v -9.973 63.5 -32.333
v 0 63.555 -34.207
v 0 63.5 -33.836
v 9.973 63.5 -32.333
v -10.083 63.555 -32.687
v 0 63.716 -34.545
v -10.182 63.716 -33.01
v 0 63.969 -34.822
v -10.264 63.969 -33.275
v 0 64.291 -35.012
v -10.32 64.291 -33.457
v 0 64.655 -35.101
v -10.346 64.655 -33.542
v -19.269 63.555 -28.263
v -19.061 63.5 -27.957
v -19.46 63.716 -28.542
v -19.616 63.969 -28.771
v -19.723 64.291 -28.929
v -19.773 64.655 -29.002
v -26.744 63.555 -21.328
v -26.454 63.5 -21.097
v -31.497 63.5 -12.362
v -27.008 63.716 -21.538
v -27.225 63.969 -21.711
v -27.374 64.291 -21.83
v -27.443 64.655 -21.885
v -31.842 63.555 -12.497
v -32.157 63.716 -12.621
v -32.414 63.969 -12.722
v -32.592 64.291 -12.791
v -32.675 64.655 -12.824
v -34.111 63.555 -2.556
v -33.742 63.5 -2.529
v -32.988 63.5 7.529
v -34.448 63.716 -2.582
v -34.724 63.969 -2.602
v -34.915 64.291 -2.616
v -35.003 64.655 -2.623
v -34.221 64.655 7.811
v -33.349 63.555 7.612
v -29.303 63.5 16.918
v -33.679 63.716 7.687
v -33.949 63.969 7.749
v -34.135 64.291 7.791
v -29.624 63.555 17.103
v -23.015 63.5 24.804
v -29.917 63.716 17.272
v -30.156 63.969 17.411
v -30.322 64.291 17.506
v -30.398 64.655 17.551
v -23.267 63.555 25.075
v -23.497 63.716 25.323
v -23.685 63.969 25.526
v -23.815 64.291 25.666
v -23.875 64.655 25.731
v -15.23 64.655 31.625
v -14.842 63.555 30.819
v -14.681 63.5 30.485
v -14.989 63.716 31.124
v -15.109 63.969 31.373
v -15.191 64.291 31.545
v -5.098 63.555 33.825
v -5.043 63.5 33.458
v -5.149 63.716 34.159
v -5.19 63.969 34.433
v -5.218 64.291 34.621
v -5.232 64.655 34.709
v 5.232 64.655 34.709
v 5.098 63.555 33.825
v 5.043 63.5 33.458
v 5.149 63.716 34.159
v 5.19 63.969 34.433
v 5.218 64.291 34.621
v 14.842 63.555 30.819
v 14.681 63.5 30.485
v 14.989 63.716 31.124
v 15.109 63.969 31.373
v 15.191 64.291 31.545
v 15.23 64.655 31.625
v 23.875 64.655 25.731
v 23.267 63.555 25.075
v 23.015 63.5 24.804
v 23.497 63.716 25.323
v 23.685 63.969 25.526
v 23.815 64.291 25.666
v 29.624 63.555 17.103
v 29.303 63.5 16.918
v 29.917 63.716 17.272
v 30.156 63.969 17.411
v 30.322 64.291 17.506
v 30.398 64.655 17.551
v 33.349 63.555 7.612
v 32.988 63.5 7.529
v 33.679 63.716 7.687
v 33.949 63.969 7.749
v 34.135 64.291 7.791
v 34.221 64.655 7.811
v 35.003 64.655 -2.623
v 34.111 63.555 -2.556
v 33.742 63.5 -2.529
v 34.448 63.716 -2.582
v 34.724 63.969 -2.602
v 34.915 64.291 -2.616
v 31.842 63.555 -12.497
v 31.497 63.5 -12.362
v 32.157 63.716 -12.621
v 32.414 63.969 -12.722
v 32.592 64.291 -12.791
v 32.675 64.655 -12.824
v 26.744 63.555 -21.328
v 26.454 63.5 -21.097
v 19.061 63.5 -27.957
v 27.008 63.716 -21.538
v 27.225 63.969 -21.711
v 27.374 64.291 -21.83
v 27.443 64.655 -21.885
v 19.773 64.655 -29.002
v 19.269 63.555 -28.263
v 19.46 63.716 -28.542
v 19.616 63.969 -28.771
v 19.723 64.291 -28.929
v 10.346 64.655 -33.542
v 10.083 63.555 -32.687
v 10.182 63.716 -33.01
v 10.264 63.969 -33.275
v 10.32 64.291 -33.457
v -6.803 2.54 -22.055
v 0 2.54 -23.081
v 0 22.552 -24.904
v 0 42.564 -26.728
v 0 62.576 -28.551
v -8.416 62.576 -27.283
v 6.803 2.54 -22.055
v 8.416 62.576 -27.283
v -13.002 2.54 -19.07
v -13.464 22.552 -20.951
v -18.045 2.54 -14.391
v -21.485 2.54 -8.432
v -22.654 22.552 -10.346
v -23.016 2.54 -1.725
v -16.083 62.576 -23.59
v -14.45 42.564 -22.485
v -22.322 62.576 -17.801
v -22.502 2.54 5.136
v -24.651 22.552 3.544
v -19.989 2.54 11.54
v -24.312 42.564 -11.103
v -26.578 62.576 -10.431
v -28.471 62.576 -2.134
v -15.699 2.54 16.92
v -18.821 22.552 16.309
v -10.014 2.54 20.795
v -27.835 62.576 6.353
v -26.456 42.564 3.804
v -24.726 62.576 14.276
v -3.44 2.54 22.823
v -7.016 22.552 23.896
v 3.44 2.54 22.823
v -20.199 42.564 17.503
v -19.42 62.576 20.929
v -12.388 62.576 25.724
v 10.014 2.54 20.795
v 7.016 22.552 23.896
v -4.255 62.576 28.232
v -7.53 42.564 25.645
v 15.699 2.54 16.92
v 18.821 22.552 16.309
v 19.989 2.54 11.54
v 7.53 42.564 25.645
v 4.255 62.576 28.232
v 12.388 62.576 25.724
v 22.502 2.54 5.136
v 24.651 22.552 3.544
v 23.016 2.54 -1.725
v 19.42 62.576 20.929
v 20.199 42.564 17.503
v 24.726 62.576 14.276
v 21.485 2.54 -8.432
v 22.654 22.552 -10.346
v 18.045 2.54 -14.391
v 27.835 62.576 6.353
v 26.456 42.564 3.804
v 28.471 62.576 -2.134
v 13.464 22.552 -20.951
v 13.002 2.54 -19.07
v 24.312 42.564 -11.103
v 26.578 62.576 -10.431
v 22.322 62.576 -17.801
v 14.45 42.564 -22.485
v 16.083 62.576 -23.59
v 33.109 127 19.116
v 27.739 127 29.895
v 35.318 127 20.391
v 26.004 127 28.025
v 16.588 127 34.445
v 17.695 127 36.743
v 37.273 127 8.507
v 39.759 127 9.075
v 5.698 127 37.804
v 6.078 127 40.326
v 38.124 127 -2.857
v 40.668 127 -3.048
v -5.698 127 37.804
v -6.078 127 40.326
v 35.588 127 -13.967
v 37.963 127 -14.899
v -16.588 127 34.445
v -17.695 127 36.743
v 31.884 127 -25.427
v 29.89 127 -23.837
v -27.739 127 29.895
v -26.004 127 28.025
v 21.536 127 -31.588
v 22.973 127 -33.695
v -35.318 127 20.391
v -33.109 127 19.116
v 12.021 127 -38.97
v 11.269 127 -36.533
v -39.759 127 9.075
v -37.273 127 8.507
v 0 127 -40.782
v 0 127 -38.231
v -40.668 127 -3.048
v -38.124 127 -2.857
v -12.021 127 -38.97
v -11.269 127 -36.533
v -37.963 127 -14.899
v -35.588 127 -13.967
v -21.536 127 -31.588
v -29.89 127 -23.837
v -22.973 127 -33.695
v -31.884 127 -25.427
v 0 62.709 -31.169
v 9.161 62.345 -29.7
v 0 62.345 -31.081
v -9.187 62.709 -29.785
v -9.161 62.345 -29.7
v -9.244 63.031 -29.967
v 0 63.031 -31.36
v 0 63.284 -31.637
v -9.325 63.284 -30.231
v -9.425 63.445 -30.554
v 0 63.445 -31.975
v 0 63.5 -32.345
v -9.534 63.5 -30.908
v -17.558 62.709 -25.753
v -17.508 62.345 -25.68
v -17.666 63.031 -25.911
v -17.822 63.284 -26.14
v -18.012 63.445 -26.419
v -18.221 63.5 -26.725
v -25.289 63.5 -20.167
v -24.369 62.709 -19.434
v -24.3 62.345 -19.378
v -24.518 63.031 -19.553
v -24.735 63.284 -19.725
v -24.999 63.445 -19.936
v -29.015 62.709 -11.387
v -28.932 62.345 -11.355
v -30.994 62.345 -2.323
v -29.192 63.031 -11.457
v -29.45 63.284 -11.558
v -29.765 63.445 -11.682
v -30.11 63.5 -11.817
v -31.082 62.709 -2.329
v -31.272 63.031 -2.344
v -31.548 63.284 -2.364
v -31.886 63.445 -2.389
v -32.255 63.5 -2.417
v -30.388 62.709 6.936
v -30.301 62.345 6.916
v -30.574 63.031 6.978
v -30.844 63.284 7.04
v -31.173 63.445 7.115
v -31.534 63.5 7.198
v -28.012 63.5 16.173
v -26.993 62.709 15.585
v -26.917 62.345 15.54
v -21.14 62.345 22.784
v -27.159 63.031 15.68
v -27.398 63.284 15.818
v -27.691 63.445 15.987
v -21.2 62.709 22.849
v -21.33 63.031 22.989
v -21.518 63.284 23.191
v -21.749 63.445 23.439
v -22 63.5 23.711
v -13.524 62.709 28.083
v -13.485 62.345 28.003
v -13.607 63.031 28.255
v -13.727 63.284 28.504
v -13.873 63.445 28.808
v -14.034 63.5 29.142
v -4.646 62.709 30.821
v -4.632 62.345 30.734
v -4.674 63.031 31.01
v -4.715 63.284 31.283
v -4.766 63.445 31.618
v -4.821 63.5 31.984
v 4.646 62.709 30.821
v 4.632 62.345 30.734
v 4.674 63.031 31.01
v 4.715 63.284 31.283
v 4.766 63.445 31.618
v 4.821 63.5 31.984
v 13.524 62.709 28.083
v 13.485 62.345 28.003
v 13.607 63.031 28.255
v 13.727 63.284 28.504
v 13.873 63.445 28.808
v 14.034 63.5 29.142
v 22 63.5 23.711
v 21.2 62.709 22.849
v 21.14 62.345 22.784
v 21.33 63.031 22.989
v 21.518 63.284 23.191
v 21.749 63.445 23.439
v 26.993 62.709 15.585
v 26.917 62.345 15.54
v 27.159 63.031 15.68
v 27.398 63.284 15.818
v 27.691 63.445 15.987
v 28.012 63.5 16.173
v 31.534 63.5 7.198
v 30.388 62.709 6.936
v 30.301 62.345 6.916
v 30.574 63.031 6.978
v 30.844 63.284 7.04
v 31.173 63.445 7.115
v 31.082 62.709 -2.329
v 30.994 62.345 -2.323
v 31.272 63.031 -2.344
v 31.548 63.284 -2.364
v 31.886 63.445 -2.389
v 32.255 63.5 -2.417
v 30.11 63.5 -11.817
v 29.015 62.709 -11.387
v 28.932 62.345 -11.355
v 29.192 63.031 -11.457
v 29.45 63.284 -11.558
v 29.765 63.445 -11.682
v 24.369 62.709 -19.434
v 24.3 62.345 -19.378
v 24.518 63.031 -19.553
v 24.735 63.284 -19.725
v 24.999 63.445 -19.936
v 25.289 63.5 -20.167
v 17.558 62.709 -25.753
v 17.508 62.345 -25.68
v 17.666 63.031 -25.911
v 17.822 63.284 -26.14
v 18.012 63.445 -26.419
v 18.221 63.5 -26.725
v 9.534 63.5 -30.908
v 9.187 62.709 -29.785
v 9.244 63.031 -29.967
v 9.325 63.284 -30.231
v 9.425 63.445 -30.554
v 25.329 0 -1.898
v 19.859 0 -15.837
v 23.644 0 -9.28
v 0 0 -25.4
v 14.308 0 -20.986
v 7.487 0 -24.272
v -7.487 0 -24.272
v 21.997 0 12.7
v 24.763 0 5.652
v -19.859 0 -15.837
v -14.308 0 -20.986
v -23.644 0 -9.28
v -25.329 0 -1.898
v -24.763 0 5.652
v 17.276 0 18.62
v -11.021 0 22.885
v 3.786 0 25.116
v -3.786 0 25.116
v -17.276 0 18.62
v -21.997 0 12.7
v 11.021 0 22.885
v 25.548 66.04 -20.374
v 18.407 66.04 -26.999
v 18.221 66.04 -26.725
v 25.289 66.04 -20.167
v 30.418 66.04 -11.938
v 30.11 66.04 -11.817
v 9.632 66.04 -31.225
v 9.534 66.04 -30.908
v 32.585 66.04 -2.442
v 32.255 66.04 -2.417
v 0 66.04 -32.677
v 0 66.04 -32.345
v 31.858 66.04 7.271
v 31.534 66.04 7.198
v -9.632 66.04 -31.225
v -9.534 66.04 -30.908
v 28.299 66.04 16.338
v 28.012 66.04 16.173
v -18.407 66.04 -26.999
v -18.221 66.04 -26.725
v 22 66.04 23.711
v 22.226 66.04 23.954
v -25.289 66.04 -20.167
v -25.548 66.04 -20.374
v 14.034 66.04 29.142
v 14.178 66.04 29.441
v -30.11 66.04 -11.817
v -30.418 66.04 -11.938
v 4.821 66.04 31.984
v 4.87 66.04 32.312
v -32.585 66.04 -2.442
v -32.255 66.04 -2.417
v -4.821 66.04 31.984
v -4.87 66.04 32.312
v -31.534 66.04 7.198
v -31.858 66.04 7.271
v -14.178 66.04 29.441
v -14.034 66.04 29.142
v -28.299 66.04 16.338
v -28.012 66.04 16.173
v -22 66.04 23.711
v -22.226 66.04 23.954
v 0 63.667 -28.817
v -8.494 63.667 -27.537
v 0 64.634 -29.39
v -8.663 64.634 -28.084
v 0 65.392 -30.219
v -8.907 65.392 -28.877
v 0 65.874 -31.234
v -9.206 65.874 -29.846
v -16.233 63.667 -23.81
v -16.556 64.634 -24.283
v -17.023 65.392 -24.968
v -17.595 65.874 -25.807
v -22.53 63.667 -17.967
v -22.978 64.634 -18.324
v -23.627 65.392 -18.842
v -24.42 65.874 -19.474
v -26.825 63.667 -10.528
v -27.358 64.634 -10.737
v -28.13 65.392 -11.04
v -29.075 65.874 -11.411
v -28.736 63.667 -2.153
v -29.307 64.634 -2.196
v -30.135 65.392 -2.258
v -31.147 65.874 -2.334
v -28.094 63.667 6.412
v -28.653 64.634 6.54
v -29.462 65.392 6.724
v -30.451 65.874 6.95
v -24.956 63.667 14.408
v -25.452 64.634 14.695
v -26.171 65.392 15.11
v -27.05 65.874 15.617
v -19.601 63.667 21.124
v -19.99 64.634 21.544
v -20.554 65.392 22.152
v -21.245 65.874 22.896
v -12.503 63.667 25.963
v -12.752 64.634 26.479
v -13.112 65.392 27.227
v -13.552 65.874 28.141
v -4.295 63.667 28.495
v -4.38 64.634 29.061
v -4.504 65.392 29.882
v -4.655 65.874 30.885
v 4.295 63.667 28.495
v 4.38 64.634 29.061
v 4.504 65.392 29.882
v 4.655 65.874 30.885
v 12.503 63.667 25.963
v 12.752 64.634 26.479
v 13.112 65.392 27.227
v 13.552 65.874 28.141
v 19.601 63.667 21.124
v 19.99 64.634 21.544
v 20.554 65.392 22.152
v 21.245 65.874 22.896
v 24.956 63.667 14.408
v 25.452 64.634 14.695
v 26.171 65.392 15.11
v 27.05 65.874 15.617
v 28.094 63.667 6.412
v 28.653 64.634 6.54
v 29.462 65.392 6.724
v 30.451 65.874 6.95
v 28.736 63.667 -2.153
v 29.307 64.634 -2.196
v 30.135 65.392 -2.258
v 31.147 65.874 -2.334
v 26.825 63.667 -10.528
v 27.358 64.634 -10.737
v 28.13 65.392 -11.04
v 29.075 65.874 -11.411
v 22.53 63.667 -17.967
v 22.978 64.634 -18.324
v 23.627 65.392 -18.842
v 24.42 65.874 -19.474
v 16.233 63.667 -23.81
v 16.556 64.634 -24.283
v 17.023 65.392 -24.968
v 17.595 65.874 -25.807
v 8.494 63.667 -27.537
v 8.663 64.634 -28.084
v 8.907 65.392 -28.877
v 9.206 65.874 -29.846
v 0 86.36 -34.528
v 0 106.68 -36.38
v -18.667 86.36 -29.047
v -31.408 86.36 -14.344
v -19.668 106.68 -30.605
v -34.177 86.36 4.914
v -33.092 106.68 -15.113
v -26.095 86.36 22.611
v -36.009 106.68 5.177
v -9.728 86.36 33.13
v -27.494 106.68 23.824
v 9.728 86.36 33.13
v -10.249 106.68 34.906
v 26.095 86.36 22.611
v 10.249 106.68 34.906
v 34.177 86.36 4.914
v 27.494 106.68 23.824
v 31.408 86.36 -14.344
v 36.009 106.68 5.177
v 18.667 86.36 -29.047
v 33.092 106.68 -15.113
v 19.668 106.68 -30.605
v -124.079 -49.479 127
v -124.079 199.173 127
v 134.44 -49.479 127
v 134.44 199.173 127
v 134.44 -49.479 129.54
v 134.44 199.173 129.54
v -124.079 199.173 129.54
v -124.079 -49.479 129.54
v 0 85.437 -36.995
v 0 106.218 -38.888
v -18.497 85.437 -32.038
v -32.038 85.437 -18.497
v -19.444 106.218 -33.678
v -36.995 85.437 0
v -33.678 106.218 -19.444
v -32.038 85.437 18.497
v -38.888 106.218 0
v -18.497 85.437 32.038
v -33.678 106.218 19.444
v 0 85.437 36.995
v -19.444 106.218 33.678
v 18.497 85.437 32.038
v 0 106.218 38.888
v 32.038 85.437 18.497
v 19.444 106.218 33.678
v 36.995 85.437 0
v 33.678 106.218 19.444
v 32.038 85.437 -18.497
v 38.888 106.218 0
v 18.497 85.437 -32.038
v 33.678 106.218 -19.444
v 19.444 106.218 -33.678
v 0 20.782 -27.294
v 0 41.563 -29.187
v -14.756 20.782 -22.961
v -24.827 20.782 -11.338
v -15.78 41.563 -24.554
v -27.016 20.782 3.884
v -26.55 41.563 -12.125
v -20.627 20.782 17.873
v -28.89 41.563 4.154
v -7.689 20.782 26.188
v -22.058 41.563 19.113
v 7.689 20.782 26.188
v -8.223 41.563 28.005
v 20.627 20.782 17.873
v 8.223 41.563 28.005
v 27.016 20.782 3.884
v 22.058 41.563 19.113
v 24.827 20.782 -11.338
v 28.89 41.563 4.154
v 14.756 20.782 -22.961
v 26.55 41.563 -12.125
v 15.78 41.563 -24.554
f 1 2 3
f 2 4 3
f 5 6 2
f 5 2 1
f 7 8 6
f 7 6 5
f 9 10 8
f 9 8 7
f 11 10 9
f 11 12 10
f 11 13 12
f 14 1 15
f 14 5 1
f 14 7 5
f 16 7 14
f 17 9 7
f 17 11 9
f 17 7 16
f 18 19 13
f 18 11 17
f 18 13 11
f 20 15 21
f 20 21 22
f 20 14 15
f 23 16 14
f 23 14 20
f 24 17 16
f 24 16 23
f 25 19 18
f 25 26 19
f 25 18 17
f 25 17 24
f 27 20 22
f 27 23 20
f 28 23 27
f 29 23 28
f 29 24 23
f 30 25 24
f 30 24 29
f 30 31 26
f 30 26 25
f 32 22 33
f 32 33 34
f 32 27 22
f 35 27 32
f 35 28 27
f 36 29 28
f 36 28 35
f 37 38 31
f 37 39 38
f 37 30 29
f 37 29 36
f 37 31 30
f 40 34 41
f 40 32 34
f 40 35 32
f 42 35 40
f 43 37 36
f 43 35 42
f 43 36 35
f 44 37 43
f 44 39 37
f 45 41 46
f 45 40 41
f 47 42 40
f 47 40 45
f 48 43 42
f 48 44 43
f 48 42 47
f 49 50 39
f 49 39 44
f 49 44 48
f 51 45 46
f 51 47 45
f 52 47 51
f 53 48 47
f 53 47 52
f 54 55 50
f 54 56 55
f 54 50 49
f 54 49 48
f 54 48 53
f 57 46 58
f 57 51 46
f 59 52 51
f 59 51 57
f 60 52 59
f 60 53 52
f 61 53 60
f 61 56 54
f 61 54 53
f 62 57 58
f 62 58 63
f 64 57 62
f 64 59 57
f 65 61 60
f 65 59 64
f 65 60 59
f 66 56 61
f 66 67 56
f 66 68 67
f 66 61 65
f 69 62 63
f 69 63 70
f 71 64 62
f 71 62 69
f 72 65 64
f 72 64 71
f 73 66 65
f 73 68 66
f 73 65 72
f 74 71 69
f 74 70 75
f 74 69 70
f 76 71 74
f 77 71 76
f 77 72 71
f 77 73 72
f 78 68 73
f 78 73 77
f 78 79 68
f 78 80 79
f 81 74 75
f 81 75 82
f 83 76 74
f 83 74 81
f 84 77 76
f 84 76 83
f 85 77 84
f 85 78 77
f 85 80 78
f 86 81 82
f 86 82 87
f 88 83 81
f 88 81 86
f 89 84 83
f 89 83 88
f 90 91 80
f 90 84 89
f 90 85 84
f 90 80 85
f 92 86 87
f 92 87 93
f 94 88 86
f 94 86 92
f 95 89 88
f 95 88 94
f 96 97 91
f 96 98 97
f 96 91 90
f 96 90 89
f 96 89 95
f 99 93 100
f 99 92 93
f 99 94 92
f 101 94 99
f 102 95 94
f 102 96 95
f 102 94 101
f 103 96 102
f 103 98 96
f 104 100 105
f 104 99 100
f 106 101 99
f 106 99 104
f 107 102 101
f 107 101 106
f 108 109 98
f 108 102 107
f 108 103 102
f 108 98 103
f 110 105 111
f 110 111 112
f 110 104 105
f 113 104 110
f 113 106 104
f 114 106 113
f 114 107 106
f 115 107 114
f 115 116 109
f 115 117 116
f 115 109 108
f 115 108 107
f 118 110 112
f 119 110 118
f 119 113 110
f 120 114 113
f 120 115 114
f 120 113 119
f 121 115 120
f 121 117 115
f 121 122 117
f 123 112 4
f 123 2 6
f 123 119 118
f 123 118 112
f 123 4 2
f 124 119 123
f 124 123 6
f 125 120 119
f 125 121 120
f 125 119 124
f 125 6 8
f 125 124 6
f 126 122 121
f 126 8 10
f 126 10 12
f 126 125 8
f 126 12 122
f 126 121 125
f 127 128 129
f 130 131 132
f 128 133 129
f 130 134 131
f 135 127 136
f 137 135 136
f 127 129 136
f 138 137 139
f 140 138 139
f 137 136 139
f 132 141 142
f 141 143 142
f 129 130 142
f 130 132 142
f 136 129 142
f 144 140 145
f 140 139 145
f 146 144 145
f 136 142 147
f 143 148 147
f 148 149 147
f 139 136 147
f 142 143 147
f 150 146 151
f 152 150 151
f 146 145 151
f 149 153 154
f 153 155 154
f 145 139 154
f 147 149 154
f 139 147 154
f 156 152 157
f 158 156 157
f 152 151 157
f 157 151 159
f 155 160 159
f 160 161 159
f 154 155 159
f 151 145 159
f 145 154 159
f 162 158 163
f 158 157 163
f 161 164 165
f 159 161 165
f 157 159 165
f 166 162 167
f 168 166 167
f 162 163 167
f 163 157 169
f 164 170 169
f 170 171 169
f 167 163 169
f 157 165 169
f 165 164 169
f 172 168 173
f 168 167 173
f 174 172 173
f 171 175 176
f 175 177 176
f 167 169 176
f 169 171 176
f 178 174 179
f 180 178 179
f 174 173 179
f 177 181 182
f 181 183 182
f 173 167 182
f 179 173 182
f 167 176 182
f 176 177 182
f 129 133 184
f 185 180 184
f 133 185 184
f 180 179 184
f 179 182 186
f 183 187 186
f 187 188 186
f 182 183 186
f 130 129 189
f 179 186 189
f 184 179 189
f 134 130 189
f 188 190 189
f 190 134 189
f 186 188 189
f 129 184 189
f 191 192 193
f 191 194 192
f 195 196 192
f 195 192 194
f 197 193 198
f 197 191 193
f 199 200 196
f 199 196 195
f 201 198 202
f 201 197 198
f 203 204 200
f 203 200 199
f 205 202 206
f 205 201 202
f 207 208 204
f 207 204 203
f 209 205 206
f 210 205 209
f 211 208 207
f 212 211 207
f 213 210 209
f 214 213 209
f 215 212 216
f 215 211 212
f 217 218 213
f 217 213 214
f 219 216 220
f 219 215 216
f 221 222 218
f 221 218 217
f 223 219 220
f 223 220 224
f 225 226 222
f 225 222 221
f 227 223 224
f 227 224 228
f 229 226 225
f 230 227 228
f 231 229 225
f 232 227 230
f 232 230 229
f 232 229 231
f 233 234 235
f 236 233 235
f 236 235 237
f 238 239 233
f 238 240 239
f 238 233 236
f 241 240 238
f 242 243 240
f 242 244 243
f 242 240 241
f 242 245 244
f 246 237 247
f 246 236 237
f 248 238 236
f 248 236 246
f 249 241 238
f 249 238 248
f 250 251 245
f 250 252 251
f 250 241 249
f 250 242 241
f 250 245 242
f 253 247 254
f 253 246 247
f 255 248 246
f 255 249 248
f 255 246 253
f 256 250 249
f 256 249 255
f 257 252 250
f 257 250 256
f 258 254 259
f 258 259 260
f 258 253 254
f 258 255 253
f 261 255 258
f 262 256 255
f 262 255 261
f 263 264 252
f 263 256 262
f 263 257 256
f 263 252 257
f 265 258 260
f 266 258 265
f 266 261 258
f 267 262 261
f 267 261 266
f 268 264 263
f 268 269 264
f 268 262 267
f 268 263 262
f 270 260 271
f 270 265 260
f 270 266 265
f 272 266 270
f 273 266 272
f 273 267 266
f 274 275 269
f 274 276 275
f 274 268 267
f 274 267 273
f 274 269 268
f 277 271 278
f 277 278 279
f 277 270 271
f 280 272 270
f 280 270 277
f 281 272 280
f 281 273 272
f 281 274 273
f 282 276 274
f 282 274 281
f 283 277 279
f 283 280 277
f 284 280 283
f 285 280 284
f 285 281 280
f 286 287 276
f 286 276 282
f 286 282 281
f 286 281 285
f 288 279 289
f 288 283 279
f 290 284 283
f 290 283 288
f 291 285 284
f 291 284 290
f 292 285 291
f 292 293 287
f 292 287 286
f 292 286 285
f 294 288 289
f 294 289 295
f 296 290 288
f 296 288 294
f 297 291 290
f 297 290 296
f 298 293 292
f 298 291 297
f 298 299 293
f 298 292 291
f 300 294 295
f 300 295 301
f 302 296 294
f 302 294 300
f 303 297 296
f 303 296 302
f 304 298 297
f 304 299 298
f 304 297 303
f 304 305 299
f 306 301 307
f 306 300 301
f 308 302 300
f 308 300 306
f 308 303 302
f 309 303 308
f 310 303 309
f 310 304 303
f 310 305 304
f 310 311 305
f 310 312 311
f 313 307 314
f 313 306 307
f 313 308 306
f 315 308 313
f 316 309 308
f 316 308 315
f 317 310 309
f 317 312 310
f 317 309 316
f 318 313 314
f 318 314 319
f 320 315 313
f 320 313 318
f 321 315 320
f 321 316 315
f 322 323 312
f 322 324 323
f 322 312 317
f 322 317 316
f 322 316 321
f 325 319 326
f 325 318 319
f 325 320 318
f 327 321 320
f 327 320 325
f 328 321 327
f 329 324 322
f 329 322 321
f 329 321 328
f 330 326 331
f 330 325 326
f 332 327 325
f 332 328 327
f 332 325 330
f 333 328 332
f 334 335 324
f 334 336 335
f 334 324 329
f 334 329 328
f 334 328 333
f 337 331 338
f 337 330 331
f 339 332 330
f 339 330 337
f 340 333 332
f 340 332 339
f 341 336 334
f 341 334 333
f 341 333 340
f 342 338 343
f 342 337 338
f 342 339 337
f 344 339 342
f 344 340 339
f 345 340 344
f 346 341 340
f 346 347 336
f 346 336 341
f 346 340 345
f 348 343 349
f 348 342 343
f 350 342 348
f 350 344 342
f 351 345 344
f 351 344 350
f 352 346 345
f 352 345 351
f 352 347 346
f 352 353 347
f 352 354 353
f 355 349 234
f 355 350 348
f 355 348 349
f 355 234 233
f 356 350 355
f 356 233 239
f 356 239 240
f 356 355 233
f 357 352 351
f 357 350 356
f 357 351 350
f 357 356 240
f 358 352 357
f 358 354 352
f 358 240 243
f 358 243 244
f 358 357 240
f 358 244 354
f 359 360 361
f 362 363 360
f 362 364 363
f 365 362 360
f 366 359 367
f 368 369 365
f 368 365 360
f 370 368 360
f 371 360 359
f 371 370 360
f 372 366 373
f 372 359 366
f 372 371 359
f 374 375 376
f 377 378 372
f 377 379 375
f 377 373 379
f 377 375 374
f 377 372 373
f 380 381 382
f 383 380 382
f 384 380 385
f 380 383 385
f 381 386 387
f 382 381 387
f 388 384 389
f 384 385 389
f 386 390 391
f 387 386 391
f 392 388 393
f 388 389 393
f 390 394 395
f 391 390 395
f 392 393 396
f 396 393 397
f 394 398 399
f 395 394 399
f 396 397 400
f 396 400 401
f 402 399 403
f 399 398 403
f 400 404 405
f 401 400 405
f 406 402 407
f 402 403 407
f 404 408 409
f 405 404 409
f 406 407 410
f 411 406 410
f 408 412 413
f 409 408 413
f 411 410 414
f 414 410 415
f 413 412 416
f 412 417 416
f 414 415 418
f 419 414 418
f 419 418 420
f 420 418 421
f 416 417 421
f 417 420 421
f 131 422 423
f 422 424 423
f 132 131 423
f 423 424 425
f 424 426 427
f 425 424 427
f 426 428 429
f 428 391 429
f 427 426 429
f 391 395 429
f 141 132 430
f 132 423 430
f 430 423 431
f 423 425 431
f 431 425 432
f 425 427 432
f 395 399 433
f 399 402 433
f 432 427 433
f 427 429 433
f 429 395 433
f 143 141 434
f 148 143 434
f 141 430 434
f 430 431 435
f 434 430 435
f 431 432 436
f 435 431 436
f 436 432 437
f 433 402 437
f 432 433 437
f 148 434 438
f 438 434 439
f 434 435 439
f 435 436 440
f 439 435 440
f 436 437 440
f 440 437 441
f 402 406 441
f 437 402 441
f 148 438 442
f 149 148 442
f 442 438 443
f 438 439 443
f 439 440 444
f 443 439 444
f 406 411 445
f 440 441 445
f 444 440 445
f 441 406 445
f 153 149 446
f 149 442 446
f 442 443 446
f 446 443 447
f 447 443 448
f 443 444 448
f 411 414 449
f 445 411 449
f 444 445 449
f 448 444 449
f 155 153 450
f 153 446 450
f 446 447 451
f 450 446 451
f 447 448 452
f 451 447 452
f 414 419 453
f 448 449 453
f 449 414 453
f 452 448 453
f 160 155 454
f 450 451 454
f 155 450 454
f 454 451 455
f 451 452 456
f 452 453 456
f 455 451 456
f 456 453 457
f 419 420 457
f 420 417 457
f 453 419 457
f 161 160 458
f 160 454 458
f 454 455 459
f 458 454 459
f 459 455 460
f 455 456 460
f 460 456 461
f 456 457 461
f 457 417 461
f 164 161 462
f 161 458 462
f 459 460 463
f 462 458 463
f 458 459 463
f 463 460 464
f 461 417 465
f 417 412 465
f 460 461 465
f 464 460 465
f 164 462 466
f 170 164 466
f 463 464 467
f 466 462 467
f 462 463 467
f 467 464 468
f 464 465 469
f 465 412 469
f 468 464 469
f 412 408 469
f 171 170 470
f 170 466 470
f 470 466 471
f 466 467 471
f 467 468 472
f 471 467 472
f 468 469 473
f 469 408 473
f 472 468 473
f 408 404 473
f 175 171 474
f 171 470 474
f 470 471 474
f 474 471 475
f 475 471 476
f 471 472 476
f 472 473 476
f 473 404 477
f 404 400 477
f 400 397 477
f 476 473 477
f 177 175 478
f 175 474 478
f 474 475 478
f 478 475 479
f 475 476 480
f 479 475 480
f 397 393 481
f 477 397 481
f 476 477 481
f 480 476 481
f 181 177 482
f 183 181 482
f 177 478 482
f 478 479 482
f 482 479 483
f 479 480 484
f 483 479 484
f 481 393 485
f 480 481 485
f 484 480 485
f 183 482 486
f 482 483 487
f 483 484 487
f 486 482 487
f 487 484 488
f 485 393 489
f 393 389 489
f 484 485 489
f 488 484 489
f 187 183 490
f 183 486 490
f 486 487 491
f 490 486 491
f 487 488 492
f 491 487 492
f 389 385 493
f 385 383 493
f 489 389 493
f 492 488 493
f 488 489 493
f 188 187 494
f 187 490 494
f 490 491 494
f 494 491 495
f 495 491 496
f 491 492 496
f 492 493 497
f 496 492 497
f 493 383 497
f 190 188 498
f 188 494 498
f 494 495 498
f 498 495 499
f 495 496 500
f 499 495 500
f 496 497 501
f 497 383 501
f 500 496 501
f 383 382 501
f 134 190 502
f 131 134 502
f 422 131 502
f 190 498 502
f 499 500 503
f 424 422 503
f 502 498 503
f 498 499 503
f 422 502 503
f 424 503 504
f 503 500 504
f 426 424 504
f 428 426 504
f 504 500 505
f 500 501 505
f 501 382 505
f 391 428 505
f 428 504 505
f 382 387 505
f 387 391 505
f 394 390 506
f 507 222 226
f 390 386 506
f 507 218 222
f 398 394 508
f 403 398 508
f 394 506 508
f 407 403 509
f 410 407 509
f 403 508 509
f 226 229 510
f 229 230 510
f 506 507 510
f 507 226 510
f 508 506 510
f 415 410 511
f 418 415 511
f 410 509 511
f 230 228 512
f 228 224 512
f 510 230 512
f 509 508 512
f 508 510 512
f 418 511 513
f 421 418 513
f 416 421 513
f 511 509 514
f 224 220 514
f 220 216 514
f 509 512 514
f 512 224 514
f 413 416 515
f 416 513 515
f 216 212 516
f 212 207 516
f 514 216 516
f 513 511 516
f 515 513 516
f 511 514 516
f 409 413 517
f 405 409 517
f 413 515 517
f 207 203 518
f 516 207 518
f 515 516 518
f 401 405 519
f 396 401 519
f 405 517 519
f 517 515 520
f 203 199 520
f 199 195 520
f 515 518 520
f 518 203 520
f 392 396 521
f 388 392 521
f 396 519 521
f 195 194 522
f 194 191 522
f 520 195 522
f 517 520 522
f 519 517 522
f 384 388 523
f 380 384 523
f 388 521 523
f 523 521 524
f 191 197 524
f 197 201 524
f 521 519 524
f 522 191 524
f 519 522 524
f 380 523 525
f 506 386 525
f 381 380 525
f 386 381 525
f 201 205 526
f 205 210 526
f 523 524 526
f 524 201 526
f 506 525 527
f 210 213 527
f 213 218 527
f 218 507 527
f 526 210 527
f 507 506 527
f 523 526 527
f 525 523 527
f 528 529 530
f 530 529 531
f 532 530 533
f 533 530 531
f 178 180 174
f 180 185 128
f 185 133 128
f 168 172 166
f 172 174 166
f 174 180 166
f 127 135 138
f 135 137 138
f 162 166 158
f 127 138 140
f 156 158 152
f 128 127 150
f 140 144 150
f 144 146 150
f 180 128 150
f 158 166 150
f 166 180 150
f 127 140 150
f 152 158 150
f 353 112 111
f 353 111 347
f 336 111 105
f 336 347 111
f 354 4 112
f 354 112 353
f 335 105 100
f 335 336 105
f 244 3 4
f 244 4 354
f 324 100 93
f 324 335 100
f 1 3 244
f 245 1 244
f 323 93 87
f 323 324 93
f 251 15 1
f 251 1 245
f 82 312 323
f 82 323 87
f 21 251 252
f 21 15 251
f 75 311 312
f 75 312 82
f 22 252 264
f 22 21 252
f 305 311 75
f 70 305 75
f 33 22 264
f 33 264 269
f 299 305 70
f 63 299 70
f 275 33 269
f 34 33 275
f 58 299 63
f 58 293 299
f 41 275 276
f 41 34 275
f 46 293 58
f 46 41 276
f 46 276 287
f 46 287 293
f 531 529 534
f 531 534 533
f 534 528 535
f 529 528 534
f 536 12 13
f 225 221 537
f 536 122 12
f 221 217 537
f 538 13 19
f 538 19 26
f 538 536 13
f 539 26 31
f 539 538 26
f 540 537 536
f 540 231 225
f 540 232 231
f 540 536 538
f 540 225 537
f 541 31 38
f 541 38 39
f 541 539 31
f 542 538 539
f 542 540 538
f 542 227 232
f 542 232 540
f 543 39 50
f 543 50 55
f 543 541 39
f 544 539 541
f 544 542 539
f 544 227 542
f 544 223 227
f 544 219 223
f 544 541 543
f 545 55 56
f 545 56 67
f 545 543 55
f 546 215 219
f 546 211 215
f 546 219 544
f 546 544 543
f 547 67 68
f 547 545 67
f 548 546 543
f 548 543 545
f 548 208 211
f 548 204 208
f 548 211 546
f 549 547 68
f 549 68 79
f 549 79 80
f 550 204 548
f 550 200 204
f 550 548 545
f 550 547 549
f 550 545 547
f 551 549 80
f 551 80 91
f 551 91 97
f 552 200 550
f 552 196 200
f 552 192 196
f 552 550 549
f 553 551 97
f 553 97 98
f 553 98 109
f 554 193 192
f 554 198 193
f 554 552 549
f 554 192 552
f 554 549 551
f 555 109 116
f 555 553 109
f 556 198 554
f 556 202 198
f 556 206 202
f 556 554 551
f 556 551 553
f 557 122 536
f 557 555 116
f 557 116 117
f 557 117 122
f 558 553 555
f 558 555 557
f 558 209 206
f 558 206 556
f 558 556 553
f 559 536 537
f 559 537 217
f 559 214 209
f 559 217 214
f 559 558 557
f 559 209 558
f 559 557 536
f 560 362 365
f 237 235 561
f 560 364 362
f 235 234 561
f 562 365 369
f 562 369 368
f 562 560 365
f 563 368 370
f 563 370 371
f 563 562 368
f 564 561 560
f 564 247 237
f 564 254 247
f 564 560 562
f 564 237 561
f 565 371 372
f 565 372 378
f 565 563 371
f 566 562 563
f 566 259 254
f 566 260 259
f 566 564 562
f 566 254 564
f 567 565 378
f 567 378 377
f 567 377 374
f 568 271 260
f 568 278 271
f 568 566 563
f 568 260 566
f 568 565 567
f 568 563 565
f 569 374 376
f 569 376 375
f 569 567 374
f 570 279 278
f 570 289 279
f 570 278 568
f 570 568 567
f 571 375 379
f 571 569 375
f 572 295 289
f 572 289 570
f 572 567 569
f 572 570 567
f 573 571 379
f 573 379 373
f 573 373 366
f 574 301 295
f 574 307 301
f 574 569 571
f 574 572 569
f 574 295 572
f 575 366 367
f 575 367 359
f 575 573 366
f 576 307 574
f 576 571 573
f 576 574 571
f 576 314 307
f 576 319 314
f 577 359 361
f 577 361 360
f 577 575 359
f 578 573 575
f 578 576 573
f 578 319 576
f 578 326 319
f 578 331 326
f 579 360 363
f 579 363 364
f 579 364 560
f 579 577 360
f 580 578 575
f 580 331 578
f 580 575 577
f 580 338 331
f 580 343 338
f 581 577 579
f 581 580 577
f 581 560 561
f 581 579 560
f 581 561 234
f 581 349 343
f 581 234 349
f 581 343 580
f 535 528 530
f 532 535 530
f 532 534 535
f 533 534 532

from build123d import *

# Parameters (mm, degrees)
FILLET1_R           = 1.27
SHELL1_T            = -2.54
SKETCH2_W           = 258.519296789
SKETCH2_H           = 248.652148056
BOSS_EXTRUDE1_DEPTH = 2.54


with BuildPart() as part:
    # Sketch1 → Revolve2 (revolve)
    with BuildSketch(Plane.XY, mode=Mode.PRIVATE) as revolve2_sk:
        Polygon((0, 0), (25.4, 0), (31.185877256, 63.5), (34.995877256, 63.5), (40.781754513, 127), (0, 127), align=None)
    revolve(revolve2_sk.sketch.rotate(Axis((0, 0, 0), (0, 1, 0)), 90), axis=Axis((0, 0, 0), (0, 1, 0)))

    # Fillet1
    fillet1_edges = [part.edges().sort_by_distance(p)[0] for p in [
        (0, 63.5, 34.995877256),
        (0, 63.5, 31.185877256),
    ]]
    fillet(fillet1_edges, radius=FILLET1_R)

    # Shell1
    shell1_openings = [part.faces().sort_by_distance(p)[0] for p in [
        (0, 127, 0),
    ]]
    offset(amount=SHELL1_T, openings=shell1_openings, kind=Kind.INTERSECTION)


with BuildPart() as body_2:
    # Sketch2 → Boss-Extrude1 (new body)
    with BuildSketch(Plane.XY.offset(127)):
        with Locations((5.180253085, 74.847221042)):
            Rectangle(SKETCH2_W, SKETCH2_H)
    extrude(amount=BOSS_EXTRUDE1_DEPTH)


solid = Compound([part.part, body_2.part])
